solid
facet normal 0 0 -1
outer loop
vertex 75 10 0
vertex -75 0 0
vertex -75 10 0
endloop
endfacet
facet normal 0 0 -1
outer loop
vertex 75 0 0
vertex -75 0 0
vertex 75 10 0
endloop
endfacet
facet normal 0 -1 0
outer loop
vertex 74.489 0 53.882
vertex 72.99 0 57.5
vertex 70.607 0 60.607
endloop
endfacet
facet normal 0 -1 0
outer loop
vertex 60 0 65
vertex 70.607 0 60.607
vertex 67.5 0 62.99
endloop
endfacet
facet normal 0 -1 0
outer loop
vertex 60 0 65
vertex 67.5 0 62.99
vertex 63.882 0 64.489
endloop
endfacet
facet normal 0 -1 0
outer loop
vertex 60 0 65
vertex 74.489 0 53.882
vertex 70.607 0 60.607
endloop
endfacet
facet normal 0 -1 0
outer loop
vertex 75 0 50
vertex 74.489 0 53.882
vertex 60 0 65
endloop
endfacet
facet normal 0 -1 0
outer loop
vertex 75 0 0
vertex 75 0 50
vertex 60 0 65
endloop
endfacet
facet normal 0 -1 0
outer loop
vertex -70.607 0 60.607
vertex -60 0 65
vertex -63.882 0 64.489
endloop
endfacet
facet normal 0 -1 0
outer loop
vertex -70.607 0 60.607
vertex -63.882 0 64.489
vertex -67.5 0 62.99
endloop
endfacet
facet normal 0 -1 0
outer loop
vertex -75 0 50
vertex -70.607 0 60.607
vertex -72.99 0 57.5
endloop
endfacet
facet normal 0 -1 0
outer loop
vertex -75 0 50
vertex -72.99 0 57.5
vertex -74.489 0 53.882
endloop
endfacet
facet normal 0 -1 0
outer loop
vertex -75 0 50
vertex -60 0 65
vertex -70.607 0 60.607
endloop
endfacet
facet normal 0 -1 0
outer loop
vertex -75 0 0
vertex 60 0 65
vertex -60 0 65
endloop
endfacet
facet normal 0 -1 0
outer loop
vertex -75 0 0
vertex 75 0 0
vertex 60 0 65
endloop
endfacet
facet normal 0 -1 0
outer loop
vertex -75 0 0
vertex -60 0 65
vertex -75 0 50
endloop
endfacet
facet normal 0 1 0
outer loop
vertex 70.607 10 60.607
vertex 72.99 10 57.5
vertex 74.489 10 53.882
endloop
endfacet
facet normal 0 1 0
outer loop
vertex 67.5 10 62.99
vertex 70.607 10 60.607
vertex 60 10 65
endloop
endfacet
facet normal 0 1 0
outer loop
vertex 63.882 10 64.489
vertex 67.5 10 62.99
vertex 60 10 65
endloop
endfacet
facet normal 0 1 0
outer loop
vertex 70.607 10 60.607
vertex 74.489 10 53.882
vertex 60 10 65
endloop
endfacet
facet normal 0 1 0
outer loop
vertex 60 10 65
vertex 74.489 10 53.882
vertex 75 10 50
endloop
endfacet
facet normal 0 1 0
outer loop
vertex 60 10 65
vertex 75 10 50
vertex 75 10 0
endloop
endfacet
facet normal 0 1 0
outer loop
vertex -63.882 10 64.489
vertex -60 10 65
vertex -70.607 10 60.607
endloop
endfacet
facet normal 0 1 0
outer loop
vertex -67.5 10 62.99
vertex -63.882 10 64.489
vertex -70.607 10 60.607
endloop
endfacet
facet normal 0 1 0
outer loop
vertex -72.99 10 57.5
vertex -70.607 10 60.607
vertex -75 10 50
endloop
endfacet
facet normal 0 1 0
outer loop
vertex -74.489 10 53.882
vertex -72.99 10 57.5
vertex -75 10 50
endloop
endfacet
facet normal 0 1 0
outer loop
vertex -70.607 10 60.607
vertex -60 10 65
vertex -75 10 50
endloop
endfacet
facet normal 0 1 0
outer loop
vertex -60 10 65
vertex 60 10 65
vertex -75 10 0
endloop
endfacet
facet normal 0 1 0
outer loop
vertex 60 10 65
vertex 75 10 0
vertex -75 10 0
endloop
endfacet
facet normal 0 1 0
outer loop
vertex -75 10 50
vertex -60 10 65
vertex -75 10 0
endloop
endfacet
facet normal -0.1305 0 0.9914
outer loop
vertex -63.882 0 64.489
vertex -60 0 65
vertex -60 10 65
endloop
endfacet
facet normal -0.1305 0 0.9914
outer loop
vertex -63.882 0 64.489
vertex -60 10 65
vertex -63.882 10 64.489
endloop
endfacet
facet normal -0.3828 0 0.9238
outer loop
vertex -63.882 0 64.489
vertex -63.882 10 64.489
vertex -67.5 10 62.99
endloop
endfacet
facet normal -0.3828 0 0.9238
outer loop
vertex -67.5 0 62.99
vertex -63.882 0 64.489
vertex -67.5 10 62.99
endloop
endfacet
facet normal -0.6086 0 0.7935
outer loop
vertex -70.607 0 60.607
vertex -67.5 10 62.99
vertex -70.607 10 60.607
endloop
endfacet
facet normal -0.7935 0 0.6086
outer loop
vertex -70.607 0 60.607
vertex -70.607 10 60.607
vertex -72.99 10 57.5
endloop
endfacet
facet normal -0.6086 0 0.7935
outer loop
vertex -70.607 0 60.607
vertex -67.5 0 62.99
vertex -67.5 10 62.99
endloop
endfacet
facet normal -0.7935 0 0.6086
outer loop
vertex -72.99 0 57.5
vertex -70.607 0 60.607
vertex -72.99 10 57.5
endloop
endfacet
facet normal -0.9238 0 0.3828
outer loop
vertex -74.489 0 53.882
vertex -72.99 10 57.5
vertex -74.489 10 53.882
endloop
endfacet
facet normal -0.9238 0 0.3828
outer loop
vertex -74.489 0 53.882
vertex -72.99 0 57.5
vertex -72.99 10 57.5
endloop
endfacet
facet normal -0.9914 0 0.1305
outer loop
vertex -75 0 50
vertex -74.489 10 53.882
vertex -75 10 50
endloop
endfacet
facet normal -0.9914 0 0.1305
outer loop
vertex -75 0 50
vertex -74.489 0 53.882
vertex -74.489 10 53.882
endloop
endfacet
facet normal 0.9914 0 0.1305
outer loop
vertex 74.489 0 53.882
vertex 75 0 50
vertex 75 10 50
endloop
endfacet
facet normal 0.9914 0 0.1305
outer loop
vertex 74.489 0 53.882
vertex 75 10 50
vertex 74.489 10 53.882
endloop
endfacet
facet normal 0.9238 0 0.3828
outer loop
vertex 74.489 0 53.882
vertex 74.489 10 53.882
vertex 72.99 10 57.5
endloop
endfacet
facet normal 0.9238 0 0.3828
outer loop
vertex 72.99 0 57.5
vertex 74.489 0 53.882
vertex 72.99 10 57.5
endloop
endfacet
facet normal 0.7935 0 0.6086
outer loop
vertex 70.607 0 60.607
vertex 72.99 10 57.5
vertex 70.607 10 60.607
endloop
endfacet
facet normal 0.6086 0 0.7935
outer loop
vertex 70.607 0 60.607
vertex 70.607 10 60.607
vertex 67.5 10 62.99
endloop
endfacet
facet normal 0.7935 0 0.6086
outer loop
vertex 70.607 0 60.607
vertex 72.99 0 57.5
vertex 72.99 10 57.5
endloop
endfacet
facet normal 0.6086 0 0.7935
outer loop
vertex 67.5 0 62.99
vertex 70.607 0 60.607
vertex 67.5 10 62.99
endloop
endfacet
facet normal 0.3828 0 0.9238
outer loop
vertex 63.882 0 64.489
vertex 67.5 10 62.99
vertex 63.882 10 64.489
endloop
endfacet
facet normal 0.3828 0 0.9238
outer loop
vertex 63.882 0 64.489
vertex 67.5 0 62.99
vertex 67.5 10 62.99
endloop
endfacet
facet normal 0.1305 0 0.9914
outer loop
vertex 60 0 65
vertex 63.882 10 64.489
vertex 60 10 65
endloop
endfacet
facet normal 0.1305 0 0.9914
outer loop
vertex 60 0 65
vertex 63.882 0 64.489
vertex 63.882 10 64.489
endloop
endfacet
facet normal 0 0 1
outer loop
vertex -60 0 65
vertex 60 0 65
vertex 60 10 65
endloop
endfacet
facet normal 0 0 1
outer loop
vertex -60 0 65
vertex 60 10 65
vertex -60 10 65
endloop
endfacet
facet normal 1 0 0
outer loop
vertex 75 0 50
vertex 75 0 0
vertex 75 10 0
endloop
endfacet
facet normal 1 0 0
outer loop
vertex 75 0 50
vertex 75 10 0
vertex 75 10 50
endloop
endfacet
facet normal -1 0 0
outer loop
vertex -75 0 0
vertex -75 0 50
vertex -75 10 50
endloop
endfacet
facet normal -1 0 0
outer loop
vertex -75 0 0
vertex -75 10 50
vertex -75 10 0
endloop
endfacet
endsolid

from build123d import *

# Parameters (mm, degrees)
BOSS_EXTRUDE1_DEPTH = 10


with BuildPart() as part:
    # Sketch1 → Boss-Extrude1 (new body)
    with BuildSketch(Plane(origin=(0, 0, 0), x_dir=(1, 0, 0), z_dir=(0, 1, 0))):
        with BuildLine():
            Line((-75, 0), (75, 0))
            Line((75, 0), (75, -50))
            ThreePointArc((75, -50), (70.606601718, -60.606601718), (60, -65))
            Line((60, -65), (-60, -65))
            ThreePointArc((-60, -65), (-70.606601718, -60.606601718), (-75, -50))
            Line((-75, -50), (-75, 0))
        make_face()
    extrude(amount=BOSS_EXTRUDE1_DEPTH)


solid = part.part
